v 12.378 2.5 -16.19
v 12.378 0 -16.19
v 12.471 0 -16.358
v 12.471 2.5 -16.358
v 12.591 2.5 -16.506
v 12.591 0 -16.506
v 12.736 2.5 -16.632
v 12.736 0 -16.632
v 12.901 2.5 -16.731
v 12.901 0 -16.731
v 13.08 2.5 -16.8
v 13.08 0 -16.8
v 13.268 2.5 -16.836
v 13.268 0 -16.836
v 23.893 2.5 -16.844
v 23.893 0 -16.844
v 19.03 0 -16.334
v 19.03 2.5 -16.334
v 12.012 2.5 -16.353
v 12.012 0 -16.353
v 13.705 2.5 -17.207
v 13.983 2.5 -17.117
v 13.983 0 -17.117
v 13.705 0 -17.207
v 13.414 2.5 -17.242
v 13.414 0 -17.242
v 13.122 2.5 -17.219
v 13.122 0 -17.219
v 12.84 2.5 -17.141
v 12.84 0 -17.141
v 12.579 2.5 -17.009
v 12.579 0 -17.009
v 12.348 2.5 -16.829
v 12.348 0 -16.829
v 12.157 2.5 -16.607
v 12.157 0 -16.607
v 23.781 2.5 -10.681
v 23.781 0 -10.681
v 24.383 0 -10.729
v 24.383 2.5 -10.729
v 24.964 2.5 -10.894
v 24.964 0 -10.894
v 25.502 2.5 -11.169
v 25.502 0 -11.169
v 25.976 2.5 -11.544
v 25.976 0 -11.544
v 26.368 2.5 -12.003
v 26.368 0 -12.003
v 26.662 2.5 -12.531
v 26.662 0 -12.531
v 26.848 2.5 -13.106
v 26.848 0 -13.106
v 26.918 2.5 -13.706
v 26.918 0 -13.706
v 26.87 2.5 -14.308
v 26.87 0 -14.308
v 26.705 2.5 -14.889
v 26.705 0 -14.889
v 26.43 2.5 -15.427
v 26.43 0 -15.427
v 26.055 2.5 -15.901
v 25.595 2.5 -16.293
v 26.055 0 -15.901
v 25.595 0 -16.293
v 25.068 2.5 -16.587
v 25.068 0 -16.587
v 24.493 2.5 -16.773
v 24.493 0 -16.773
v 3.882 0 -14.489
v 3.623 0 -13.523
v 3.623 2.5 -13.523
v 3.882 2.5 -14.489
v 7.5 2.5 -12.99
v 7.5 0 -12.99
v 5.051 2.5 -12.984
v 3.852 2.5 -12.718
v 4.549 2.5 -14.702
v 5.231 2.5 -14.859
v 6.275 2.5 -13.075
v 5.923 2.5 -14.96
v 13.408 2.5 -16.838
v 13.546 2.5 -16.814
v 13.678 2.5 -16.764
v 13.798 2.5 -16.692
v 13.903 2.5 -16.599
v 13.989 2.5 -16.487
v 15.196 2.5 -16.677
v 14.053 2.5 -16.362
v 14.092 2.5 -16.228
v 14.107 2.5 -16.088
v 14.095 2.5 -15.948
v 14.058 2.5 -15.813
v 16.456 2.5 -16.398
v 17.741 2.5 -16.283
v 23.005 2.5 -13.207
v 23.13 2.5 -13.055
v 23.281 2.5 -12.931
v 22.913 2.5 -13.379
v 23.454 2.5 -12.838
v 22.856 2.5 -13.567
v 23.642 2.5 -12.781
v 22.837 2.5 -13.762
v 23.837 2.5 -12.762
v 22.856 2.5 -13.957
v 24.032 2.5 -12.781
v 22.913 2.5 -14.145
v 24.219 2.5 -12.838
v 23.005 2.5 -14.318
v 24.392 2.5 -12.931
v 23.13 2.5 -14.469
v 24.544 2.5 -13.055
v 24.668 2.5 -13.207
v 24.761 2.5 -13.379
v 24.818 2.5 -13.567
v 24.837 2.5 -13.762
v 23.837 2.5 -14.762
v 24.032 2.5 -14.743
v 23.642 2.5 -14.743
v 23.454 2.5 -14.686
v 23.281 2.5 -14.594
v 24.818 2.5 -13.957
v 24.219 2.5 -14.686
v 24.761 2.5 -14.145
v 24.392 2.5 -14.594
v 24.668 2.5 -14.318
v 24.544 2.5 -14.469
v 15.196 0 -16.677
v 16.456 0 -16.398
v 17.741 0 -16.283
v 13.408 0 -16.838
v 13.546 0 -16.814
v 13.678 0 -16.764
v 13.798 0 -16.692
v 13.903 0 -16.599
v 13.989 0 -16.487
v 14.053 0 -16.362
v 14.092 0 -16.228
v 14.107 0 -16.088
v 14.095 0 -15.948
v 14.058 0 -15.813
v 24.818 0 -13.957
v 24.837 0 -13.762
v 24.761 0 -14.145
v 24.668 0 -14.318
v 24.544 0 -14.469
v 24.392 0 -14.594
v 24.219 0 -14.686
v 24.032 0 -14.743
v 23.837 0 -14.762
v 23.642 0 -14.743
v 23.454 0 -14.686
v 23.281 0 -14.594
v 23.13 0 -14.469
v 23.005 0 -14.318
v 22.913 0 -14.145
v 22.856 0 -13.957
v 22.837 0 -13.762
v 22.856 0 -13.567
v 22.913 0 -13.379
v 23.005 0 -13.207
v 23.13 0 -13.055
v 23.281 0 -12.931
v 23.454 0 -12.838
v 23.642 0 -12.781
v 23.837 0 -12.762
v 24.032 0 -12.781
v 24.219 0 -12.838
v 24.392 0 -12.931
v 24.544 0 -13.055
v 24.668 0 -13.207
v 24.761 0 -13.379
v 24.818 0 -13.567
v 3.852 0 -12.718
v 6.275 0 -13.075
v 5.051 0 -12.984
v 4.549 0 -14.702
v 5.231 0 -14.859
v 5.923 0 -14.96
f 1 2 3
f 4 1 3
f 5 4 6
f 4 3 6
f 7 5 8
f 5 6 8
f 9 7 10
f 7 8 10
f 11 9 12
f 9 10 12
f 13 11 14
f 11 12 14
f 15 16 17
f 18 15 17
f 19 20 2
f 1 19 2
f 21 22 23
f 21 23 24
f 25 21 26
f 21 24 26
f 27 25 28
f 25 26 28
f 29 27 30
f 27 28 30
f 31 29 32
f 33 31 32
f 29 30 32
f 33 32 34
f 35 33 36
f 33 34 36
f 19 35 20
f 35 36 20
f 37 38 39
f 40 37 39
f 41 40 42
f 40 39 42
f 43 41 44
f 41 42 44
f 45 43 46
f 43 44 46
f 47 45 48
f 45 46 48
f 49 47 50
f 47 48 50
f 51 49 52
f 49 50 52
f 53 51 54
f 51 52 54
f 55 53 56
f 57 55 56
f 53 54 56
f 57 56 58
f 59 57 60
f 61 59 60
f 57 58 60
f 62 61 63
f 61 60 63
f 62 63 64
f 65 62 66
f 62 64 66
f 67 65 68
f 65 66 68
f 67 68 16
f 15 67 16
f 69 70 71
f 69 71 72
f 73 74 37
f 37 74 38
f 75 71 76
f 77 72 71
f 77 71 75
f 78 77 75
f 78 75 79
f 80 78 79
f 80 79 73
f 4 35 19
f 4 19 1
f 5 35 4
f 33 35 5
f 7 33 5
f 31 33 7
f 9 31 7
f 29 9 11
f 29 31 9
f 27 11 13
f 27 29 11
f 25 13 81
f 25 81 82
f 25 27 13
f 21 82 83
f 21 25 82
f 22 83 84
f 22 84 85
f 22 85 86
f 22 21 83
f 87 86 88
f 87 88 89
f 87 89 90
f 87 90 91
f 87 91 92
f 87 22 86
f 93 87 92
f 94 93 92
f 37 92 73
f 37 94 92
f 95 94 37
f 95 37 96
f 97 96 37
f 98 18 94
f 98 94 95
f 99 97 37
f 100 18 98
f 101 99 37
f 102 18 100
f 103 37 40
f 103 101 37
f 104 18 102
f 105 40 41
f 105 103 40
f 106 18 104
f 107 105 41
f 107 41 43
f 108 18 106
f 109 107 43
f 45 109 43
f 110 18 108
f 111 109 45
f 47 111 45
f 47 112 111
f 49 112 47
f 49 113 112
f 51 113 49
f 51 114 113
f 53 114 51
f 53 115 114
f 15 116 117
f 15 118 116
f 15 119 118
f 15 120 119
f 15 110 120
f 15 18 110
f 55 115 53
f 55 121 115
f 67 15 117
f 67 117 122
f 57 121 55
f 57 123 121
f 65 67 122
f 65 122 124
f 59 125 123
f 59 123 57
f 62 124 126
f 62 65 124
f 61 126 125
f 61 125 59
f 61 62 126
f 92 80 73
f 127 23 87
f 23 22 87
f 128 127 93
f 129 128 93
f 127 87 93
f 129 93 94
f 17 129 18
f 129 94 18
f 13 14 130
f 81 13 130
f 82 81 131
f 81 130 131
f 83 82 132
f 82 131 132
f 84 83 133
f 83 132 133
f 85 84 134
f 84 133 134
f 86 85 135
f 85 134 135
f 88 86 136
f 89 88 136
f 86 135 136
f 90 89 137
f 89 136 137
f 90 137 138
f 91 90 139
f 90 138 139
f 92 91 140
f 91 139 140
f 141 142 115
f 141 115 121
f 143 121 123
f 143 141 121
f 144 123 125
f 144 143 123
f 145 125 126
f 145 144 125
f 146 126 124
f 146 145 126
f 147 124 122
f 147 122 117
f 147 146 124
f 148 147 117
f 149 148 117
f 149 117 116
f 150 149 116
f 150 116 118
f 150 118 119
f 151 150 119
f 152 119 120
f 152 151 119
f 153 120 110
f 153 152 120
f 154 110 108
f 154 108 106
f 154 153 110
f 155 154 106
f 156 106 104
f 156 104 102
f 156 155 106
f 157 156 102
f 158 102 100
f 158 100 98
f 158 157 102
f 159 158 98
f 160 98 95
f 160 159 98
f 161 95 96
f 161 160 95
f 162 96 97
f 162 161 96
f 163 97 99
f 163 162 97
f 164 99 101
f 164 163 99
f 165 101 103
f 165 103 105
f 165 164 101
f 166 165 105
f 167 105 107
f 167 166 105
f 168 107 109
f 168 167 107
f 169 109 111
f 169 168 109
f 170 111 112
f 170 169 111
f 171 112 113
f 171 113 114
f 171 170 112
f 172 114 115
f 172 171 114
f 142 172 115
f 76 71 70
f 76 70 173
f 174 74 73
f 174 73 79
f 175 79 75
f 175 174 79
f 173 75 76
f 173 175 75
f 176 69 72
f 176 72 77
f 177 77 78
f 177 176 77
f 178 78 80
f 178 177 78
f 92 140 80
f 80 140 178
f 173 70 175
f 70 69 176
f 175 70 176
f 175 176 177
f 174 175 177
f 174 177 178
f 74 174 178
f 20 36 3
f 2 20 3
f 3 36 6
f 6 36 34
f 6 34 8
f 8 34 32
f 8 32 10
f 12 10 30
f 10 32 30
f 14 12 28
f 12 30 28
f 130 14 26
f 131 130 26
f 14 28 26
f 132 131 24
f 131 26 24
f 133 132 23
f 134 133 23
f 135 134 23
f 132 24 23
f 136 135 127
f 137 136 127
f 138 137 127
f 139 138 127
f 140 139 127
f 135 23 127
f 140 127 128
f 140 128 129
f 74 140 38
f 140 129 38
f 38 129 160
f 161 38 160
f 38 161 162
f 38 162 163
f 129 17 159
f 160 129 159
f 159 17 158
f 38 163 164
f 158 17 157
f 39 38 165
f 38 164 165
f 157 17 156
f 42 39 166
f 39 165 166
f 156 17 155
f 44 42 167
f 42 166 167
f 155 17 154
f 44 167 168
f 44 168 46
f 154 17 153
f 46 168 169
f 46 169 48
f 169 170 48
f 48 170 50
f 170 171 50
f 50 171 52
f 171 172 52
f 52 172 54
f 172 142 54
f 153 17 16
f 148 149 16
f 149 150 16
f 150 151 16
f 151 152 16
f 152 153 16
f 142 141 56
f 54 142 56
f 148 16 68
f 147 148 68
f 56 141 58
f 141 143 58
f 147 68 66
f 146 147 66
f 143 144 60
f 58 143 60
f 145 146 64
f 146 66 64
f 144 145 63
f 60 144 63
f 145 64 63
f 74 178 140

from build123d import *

# Parameters (mm, degrees)
SKETCH_2_R          = 1
EXTRUDE_1_DEPTH     = 2.5
CUT_EXTRUDE_1_DEPTH = 10
FILLET_1_R          = 10


with BuildPart() as part:
    # 草图2 → 凸台-拉伸1 (new body)
    with BuildSketch(Plane(origin=(0, 0, 0), x_dir=(1, 0, 0), z_dir=(0, 1, 0))):
        with BuildLine():
            Line((14.476416474, 15.856761921), (14.874238191, 15.898449826))
            ThreePointArc((14.874238191, 15.898449826), (13.617518302, 17.223579787), (12.012278006, 16.352650461))
            Line((12.012278006, 16.352650461), (12.377645672, 16.189842387))
            ThreePointArc((12.377645672, 16.189842387), (12.736119234, 16.632239525), (13.267765014, 16.836129905))
            ThreePointArc((13.267765014, 16.836129905), (14.074924495, 16.596765827), (14.476416474, 15.856761921))
        make_face()
        with BuildLine():
            ThreePointArc((13.267765014, 16.836129905), (13.948344657, 16.54497389), (14.058411092, 15.812958962))
            Line((14.058411092, 15.812958962), (14.476416474, 15.856761921))
            ThreePointArc((14.476416474, 15.856761921), (14.074924495, 16.596765827), (13.267765014, 16.836129905))
        make_face()
        with BuildLine():
            Line((8.01763809, 14.922232709), (7.5, 12.990381057))
            Line((7.5, 12.990381057), (23.780514318, 10.680802356))
            ThreePointArc((23.780514318, 10.680802356), (26.918139154, 13.705908304), (23.893033206, 16.84353314))
            Line((23.893033206, 16.84353314), (14.874238191, 15.898449826))
            Line((14.874238191, 15.898449826), (14.476416474, 15.856761921))
            Line((14.476416474, 15.856761921), (14.058411092, 15.812958962))
            Line((14.058411092, 15.812958962), (5.923249556, 14.96047197))
            ThreePointArc((5.923249556, 14.96047197), (6.971617953, 15.005660189), (8.01763809, 14.922232709))
        make_face()
        with Locations((23.836773762, 13.762167748)):
            Circle(SKETCH_2_R, mode=Mode.SUBTRACT)
        with BuildLine():
            ThreePointArc((3.882285677, 14.488887394), (5.923249556, 14.96047197), (8.01763809, 14.922232709))
            Line((8.01763809, 14.922232709), (7.5, 12.990381057))
            ThreePointArc((7.5, 12.990381057), (5.405611466, 13.028620317), (3.364647586, 12.557035742))
            Line((3.364647586, 12.557035742), (3.882285677, 14.488887394))
        make_face()
    extrude(amount=EXTRUDE_1_DEPTH)

    # 草图3 → 切除-拉伸1 (cut)
    with BuildSketch(Plane(origin=(0, 2.5, 0), x_dir=(1, 0, 0), z_dir=(0, 1, 0))):
        Polygon((3.623466631, 13.522961568), (3.851948064, 12.718387546), (3.364647586, 12.557035742), align=None)
    extrude(amount=-CUT_EXTRUDE_1_DEPTH, mode=Mode.SUBTRACT)

    # 圆角1
    fillet_1_edges = [part.edges().sort_by_distance(p)[0] for p in [
        (14.874238191, 1.25, -15.898449826),
    ]]
    fillet(fillet_1_edges, radius=FILLET_1_R)


solid = part.part
